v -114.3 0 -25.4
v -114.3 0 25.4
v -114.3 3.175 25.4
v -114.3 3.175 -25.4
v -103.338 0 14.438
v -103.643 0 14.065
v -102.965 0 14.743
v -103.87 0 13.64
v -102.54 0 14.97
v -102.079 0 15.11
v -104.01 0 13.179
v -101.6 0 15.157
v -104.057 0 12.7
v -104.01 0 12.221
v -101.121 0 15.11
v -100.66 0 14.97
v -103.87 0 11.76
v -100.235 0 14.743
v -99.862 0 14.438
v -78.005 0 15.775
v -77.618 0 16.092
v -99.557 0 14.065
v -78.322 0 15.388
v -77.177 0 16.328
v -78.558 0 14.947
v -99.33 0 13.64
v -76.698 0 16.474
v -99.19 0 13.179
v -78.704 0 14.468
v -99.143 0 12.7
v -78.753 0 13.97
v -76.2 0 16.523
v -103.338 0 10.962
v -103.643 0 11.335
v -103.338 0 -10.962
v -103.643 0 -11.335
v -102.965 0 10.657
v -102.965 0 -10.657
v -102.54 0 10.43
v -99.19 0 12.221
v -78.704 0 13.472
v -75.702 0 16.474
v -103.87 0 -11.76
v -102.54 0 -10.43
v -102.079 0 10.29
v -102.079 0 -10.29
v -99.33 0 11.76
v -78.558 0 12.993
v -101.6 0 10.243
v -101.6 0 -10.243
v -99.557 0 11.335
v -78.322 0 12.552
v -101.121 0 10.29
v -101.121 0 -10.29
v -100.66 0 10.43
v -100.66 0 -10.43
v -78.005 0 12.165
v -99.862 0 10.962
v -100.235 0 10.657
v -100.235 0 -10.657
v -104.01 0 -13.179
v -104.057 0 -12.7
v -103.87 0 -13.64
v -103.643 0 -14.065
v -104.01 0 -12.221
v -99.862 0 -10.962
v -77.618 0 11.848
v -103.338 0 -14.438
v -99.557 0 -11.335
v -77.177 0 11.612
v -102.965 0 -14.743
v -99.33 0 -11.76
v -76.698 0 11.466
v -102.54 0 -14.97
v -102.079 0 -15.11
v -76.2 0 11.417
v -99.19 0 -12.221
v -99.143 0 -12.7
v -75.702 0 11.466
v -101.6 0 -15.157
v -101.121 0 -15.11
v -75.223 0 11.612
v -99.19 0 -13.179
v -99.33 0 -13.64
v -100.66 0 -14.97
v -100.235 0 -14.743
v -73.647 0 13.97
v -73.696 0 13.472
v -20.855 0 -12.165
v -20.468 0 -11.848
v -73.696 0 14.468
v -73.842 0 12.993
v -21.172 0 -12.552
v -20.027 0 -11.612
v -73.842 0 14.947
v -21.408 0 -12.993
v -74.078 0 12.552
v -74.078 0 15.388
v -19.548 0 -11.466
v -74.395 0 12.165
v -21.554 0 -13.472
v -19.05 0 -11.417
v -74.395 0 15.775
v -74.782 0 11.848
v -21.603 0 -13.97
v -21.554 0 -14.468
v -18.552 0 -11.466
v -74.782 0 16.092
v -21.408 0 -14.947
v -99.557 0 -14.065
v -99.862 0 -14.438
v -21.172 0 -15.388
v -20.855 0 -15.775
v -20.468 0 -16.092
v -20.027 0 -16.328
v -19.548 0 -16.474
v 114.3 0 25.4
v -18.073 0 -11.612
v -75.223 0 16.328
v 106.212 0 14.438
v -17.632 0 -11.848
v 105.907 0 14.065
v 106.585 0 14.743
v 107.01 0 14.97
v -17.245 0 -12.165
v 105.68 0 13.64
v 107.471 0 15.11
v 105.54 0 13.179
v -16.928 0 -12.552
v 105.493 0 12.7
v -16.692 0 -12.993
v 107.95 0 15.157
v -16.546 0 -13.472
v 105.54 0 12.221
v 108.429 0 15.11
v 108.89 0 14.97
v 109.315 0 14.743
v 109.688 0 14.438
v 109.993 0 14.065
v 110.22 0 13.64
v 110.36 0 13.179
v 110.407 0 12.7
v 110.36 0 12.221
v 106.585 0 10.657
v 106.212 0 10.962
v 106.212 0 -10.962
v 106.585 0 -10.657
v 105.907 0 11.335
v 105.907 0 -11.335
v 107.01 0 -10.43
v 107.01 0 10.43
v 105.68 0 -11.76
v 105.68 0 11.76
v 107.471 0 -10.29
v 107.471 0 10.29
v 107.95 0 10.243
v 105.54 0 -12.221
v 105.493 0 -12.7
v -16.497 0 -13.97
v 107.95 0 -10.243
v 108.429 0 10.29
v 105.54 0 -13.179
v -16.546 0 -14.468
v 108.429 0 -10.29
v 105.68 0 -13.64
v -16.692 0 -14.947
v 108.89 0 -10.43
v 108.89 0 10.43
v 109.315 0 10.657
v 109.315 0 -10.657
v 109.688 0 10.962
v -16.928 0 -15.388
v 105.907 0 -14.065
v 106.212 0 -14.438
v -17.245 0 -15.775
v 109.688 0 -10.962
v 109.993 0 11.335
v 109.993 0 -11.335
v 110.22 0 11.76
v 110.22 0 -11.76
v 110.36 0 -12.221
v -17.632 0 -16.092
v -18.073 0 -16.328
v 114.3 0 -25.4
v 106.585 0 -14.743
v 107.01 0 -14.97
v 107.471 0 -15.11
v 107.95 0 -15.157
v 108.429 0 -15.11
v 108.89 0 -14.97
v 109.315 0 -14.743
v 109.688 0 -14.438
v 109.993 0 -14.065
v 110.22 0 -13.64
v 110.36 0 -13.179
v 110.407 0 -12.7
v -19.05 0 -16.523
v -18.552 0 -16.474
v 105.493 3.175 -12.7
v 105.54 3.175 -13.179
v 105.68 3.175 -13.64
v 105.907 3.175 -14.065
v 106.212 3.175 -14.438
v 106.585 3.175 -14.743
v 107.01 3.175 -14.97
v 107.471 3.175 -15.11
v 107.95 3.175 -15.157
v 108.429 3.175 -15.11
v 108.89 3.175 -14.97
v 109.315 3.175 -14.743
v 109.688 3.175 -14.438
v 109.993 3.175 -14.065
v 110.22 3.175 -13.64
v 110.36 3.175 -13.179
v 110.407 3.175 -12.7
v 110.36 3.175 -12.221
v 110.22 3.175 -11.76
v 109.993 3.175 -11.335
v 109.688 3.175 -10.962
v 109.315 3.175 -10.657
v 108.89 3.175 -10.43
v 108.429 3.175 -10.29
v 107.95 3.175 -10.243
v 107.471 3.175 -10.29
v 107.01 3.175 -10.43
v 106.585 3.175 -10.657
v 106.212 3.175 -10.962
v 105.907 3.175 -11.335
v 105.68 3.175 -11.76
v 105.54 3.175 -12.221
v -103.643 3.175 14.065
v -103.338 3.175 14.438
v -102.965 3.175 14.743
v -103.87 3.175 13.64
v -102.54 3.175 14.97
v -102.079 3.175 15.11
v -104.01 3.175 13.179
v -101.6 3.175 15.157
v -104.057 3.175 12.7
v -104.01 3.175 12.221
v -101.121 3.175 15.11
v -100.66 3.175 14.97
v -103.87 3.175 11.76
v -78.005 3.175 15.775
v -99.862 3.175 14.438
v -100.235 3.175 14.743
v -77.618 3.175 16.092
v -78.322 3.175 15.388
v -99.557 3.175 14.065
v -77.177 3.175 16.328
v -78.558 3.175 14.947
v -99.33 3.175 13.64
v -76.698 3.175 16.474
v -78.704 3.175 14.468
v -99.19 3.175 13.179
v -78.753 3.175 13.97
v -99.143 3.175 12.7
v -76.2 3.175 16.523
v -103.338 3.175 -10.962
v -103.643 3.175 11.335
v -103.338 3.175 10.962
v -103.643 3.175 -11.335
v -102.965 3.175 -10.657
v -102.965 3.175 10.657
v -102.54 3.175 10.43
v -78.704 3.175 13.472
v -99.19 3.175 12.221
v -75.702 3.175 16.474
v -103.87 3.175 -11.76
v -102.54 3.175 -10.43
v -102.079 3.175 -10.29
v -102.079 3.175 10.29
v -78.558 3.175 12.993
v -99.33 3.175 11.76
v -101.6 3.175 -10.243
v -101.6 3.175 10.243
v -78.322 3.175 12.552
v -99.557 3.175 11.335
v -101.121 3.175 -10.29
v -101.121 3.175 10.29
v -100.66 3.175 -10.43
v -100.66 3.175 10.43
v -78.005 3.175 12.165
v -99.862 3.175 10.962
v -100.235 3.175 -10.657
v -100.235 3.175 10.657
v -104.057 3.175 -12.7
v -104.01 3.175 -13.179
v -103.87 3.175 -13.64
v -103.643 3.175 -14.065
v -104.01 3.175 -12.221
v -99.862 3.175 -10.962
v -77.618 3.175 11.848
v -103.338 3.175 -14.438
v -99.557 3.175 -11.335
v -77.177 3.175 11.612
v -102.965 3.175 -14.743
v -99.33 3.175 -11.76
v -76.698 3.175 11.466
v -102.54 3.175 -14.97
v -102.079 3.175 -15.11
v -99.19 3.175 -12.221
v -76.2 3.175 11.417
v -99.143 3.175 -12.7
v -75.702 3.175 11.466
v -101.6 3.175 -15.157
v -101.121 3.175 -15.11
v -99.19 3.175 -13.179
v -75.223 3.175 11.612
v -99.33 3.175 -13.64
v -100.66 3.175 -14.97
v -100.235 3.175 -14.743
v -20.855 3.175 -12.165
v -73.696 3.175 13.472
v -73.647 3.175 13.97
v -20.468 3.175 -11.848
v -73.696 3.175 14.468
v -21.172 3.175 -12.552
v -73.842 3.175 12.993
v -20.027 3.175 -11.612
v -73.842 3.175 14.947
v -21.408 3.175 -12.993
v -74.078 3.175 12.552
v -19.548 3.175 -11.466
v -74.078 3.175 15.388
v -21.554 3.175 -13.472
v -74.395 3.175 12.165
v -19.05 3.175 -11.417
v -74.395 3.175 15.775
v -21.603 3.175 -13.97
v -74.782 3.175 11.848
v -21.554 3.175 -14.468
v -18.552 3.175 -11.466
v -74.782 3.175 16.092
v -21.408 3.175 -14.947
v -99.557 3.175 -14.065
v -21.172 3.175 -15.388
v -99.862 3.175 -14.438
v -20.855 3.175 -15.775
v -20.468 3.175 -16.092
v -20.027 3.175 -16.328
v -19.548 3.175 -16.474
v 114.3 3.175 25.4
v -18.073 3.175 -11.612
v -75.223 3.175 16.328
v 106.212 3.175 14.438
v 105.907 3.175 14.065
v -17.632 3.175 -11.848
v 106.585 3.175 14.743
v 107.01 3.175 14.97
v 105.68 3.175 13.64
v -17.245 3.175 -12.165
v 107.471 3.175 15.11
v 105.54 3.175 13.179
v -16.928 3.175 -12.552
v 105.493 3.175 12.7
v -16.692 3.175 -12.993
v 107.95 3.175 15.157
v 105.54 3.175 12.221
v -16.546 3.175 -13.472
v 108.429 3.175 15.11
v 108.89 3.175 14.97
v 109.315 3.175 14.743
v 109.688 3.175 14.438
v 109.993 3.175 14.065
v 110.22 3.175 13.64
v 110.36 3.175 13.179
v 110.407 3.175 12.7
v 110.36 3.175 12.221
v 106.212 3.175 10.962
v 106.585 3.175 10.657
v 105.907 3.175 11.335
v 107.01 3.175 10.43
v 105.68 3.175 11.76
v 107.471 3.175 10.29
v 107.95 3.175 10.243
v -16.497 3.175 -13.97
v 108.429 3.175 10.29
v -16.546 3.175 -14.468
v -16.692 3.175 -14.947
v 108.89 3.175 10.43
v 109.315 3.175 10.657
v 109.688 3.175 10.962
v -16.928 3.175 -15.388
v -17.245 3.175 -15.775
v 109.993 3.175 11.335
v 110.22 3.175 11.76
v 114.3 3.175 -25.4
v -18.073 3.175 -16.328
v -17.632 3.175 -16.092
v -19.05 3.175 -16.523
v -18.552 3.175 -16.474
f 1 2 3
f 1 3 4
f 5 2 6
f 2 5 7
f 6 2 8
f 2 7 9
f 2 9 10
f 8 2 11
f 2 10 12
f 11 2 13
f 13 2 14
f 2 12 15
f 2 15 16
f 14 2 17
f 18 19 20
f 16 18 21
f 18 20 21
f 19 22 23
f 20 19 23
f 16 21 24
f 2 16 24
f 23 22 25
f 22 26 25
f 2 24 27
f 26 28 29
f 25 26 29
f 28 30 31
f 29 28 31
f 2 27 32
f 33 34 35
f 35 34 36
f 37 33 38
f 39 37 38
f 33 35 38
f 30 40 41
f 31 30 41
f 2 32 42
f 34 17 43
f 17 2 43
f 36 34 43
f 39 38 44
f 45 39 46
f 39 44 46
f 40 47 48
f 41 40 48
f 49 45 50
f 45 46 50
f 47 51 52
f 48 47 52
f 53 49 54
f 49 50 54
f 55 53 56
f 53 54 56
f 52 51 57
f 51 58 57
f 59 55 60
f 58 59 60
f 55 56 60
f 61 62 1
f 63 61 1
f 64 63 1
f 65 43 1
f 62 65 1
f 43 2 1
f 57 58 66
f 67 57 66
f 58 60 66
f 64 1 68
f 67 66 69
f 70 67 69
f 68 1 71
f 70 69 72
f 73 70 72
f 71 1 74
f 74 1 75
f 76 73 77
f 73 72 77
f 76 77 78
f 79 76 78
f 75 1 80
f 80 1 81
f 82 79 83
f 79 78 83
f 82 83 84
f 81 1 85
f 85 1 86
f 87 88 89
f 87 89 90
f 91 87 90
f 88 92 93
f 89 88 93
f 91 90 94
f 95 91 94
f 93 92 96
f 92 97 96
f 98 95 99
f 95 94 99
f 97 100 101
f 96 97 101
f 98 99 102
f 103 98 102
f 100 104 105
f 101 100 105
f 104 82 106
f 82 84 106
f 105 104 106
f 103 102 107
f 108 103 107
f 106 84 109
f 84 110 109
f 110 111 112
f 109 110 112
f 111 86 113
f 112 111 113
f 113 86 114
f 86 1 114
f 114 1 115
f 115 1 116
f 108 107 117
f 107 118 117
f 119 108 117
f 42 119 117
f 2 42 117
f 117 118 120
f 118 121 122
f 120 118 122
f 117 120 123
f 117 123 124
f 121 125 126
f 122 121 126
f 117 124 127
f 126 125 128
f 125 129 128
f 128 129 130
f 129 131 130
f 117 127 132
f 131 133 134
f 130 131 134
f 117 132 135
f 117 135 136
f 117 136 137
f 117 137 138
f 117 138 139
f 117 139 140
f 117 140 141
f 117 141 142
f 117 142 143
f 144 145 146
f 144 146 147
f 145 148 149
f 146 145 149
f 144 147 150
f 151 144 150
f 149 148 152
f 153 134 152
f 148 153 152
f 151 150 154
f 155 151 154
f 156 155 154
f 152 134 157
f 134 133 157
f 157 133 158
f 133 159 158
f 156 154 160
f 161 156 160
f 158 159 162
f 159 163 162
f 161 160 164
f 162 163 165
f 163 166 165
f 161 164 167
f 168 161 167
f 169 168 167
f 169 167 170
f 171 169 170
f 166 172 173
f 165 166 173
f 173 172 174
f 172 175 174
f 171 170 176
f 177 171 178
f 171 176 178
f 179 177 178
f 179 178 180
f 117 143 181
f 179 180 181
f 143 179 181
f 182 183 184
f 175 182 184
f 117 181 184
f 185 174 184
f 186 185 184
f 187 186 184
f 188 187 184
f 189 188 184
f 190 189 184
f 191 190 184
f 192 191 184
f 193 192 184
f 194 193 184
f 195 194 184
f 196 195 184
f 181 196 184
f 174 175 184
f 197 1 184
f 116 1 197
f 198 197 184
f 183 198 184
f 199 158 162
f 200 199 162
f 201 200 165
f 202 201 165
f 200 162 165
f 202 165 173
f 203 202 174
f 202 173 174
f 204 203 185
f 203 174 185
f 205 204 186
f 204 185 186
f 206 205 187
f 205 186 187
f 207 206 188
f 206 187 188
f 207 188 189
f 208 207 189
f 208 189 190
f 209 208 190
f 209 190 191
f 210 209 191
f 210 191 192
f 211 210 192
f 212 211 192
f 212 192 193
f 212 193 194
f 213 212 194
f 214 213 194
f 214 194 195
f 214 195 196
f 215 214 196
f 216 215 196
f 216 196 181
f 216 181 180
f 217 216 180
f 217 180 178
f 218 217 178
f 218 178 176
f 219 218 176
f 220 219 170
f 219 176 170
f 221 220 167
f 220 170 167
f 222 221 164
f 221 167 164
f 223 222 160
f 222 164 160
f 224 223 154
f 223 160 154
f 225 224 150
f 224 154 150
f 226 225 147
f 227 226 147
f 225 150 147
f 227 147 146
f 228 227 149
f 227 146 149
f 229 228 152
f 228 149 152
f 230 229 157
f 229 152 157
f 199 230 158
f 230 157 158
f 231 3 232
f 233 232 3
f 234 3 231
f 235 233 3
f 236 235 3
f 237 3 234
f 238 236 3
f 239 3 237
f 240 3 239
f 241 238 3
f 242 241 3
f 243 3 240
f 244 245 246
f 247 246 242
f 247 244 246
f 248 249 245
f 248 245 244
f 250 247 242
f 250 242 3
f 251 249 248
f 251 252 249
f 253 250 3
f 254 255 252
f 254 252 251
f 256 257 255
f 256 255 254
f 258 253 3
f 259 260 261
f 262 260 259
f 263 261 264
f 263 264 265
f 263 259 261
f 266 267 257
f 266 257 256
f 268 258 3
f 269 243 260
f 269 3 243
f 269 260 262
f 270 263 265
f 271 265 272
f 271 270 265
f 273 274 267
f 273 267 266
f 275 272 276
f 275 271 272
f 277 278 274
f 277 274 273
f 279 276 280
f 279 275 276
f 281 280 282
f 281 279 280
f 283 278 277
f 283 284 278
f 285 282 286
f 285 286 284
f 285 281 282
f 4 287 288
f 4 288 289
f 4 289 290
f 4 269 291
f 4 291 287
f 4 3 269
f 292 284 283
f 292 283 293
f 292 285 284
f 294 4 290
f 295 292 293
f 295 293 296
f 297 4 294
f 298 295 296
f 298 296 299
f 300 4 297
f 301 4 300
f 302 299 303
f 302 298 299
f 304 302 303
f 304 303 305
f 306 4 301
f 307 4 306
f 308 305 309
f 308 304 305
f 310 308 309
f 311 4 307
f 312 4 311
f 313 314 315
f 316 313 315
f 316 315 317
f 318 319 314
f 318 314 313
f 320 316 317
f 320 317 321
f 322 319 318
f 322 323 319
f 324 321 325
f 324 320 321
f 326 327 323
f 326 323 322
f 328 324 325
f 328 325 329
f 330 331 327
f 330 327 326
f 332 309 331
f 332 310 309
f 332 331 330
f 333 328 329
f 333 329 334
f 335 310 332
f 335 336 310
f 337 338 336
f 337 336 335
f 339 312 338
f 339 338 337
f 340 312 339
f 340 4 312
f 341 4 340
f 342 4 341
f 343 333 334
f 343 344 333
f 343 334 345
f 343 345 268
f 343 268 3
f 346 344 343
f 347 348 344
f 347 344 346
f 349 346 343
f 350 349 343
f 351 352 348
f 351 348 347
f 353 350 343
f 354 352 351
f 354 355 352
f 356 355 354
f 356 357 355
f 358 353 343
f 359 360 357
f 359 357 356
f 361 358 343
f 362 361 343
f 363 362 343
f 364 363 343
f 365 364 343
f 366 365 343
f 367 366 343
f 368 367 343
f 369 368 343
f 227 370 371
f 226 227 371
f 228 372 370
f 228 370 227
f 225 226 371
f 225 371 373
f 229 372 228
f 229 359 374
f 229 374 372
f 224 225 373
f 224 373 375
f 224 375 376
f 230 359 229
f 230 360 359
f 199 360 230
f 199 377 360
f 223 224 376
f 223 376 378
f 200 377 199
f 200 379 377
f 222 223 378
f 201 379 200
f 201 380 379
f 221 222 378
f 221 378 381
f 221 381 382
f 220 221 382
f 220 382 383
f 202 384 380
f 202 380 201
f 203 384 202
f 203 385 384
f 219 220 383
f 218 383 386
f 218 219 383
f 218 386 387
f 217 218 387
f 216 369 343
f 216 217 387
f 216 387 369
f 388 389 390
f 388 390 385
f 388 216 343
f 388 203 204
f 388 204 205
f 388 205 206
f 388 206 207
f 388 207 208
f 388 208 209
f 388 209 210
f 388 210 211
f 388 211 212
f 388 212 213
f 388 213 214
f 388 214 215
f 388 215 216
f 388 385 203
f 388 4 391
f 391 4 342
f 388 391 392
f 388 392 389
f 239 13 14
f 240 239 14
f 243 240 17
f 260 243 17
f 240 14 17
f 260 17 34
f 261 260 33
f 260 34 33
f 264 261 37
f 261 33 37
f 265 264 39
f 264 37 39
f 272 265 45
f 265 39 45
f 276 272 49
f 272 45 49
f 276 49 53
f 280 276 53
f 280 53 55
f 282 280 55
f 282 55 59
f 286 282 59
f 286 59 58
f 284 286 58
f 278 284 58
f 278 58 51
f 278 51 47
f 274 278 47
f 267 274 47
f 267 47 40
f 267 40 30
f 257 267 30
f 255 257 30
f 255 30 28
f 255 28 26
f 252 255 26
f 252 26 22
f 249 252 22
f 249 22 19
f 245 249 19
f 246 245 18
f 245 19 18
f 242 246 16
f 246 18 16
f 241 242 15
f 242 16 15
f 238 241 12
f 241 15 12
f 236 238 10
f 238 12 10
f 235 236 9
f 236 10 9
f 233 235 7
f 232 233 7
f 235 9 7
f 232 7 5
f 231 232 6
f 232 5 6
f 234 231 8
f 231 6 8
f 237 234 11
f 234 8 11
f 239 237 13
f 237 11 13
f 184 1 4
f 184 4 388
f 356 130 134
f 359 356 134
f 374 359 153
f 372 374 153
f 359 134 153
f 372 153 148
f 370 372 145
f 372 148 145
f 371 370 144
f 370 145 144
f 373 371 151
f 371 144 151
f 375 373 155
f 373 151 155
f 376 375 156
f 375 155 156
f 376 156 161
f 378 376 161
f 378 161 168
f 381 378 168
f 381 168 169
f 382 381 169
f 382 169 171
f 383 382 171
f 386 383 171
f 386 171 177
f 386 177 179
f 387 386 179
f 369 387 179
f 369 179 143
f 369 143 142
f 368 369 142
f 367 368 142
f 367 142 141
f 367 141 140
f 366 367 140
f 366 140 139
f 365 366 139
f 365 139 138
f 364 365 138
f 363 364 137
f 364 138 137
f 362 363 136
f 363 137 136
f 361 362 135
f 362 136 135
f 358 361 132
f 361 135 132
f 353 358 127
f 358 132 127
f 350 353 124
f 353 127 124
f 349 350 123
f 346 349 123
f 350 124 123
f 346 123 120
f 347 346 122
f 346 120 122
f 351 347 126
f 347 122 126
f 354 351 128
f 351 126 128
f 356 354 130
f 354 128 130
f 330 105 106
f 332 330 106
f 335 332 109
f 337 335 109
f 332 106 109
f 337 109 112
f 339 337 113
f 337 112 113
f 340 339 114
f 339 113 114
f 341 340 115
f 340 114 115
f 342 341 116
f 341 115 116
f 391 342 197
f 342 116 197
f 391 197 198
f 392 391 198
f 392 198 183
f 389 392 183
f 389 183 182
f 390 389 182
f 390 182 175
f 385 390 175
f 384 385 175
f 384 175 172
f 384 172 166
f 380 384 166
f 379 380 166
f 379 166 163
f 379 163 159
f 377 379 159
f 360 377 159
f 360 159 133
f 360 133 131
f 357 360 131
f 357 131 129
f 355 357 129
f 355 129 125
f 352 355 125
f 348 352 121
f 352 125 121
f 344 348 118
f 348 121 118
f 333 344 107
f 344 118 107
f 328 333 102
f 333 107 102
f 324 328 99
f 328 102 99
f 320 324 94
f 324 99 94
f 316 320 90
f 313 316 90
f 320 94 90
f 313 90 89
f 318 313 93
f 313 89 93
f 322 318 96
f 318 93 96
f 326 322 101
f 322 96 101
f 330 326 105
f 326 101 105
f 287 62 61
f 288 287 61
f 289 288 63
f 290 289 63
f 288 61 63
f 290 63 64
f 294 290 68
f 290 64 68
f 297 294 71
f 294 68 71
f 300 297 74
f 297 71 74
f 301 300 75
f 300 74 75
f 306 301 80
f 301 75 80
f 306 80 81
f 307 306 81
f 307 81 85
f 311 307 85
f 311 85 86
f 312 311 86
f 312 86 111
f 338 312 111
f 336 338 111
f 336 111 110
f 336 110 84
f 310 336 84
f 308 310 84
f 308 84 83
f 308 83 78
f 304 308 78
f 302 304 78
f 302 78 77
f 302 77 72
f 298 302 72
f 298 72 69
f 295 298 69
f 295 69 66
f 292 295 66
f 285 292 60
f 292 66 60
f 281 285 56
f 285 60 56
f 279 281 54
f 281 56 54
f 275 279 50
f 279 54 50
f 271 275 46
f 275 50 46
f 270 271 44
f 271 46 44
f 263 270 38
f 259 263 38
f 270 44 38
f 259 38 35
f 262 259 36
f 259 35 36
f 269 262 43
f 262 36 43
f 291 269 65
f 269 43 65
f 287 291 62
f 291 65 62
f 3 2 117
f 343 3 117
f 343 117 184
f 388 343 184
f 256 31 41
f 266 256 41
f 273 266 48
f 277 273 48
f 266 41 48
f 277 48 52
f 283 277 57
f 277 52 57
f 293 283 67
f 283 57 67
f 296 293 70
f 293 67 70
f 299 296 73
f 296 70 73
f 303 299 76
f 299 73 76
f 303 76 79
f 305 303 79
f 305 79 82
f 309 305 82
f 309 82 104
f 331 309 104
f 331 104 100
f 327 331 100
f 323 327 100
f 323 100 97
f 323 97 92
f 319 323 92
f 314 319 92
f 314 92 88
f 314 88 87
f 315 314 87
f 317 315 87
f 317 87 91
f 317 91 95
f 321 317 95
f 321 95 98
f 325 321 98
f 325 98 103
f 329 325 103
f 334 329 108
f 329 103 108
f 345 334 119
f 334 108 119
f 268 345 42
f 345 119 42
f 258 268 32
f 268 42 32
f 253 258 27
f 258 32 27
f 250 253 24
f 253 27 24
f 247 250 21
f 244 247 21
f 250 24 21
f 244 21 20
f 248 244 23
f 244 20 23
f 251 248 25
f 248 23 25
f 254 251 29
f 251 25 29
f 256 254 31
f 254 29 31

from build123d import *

# Parameters (mm, degrees)
SKETCH1_W                    = 228.6
SKETCH1_H                    = 50.8
BOSS_EXTRUDE1_DEPTH          = 3.175
F_10_0_1935_DIAMETER_HOLE1_D = 4.9149
F_1_4_20_TAPPED_HOLE1_D      = 5.1054


with BuildPart() as part:
    # Sketch1 → Boss-Extrude1 (new body)
    with BuildSketch(Plane(origin=(0, 0, 0), x_dir=(1, 0, 0), z_dir=(0, 1, 0))):
        Rectangle(SKETCH1_W, SKETCH1_H)
    extrude(amount=BOSS_EXTRUDE1_DEPTH)

    # #10 (0.1935) Diameter Hole1 (through all)
    with Locations(Plane(origin=(0, 3.175, 0), x_dir=(1, 0, 0), z_dir=(0, 1, 0))):
        with Locations((107.95, 12.7), (-101.6, -12.7), (-101.6, 12.7), (107.95, -12.7)):
            Hole(F_10_0_1935_DIAMETER_HOLE1_D / 2)

    # 1/4-20 Tapped Hole1 (through all)
    with Locations(Plane(origin=(0, 3.175, 0), x_dir=(1, 0, 0), z_dir=(0, 1, 0))):
        with Locations((-76.2, -13.97), (-19.05, 13.97)):
            Hole(F_1_4_20_TAPPED_HOLE1_D / 2)


solid = part.part
